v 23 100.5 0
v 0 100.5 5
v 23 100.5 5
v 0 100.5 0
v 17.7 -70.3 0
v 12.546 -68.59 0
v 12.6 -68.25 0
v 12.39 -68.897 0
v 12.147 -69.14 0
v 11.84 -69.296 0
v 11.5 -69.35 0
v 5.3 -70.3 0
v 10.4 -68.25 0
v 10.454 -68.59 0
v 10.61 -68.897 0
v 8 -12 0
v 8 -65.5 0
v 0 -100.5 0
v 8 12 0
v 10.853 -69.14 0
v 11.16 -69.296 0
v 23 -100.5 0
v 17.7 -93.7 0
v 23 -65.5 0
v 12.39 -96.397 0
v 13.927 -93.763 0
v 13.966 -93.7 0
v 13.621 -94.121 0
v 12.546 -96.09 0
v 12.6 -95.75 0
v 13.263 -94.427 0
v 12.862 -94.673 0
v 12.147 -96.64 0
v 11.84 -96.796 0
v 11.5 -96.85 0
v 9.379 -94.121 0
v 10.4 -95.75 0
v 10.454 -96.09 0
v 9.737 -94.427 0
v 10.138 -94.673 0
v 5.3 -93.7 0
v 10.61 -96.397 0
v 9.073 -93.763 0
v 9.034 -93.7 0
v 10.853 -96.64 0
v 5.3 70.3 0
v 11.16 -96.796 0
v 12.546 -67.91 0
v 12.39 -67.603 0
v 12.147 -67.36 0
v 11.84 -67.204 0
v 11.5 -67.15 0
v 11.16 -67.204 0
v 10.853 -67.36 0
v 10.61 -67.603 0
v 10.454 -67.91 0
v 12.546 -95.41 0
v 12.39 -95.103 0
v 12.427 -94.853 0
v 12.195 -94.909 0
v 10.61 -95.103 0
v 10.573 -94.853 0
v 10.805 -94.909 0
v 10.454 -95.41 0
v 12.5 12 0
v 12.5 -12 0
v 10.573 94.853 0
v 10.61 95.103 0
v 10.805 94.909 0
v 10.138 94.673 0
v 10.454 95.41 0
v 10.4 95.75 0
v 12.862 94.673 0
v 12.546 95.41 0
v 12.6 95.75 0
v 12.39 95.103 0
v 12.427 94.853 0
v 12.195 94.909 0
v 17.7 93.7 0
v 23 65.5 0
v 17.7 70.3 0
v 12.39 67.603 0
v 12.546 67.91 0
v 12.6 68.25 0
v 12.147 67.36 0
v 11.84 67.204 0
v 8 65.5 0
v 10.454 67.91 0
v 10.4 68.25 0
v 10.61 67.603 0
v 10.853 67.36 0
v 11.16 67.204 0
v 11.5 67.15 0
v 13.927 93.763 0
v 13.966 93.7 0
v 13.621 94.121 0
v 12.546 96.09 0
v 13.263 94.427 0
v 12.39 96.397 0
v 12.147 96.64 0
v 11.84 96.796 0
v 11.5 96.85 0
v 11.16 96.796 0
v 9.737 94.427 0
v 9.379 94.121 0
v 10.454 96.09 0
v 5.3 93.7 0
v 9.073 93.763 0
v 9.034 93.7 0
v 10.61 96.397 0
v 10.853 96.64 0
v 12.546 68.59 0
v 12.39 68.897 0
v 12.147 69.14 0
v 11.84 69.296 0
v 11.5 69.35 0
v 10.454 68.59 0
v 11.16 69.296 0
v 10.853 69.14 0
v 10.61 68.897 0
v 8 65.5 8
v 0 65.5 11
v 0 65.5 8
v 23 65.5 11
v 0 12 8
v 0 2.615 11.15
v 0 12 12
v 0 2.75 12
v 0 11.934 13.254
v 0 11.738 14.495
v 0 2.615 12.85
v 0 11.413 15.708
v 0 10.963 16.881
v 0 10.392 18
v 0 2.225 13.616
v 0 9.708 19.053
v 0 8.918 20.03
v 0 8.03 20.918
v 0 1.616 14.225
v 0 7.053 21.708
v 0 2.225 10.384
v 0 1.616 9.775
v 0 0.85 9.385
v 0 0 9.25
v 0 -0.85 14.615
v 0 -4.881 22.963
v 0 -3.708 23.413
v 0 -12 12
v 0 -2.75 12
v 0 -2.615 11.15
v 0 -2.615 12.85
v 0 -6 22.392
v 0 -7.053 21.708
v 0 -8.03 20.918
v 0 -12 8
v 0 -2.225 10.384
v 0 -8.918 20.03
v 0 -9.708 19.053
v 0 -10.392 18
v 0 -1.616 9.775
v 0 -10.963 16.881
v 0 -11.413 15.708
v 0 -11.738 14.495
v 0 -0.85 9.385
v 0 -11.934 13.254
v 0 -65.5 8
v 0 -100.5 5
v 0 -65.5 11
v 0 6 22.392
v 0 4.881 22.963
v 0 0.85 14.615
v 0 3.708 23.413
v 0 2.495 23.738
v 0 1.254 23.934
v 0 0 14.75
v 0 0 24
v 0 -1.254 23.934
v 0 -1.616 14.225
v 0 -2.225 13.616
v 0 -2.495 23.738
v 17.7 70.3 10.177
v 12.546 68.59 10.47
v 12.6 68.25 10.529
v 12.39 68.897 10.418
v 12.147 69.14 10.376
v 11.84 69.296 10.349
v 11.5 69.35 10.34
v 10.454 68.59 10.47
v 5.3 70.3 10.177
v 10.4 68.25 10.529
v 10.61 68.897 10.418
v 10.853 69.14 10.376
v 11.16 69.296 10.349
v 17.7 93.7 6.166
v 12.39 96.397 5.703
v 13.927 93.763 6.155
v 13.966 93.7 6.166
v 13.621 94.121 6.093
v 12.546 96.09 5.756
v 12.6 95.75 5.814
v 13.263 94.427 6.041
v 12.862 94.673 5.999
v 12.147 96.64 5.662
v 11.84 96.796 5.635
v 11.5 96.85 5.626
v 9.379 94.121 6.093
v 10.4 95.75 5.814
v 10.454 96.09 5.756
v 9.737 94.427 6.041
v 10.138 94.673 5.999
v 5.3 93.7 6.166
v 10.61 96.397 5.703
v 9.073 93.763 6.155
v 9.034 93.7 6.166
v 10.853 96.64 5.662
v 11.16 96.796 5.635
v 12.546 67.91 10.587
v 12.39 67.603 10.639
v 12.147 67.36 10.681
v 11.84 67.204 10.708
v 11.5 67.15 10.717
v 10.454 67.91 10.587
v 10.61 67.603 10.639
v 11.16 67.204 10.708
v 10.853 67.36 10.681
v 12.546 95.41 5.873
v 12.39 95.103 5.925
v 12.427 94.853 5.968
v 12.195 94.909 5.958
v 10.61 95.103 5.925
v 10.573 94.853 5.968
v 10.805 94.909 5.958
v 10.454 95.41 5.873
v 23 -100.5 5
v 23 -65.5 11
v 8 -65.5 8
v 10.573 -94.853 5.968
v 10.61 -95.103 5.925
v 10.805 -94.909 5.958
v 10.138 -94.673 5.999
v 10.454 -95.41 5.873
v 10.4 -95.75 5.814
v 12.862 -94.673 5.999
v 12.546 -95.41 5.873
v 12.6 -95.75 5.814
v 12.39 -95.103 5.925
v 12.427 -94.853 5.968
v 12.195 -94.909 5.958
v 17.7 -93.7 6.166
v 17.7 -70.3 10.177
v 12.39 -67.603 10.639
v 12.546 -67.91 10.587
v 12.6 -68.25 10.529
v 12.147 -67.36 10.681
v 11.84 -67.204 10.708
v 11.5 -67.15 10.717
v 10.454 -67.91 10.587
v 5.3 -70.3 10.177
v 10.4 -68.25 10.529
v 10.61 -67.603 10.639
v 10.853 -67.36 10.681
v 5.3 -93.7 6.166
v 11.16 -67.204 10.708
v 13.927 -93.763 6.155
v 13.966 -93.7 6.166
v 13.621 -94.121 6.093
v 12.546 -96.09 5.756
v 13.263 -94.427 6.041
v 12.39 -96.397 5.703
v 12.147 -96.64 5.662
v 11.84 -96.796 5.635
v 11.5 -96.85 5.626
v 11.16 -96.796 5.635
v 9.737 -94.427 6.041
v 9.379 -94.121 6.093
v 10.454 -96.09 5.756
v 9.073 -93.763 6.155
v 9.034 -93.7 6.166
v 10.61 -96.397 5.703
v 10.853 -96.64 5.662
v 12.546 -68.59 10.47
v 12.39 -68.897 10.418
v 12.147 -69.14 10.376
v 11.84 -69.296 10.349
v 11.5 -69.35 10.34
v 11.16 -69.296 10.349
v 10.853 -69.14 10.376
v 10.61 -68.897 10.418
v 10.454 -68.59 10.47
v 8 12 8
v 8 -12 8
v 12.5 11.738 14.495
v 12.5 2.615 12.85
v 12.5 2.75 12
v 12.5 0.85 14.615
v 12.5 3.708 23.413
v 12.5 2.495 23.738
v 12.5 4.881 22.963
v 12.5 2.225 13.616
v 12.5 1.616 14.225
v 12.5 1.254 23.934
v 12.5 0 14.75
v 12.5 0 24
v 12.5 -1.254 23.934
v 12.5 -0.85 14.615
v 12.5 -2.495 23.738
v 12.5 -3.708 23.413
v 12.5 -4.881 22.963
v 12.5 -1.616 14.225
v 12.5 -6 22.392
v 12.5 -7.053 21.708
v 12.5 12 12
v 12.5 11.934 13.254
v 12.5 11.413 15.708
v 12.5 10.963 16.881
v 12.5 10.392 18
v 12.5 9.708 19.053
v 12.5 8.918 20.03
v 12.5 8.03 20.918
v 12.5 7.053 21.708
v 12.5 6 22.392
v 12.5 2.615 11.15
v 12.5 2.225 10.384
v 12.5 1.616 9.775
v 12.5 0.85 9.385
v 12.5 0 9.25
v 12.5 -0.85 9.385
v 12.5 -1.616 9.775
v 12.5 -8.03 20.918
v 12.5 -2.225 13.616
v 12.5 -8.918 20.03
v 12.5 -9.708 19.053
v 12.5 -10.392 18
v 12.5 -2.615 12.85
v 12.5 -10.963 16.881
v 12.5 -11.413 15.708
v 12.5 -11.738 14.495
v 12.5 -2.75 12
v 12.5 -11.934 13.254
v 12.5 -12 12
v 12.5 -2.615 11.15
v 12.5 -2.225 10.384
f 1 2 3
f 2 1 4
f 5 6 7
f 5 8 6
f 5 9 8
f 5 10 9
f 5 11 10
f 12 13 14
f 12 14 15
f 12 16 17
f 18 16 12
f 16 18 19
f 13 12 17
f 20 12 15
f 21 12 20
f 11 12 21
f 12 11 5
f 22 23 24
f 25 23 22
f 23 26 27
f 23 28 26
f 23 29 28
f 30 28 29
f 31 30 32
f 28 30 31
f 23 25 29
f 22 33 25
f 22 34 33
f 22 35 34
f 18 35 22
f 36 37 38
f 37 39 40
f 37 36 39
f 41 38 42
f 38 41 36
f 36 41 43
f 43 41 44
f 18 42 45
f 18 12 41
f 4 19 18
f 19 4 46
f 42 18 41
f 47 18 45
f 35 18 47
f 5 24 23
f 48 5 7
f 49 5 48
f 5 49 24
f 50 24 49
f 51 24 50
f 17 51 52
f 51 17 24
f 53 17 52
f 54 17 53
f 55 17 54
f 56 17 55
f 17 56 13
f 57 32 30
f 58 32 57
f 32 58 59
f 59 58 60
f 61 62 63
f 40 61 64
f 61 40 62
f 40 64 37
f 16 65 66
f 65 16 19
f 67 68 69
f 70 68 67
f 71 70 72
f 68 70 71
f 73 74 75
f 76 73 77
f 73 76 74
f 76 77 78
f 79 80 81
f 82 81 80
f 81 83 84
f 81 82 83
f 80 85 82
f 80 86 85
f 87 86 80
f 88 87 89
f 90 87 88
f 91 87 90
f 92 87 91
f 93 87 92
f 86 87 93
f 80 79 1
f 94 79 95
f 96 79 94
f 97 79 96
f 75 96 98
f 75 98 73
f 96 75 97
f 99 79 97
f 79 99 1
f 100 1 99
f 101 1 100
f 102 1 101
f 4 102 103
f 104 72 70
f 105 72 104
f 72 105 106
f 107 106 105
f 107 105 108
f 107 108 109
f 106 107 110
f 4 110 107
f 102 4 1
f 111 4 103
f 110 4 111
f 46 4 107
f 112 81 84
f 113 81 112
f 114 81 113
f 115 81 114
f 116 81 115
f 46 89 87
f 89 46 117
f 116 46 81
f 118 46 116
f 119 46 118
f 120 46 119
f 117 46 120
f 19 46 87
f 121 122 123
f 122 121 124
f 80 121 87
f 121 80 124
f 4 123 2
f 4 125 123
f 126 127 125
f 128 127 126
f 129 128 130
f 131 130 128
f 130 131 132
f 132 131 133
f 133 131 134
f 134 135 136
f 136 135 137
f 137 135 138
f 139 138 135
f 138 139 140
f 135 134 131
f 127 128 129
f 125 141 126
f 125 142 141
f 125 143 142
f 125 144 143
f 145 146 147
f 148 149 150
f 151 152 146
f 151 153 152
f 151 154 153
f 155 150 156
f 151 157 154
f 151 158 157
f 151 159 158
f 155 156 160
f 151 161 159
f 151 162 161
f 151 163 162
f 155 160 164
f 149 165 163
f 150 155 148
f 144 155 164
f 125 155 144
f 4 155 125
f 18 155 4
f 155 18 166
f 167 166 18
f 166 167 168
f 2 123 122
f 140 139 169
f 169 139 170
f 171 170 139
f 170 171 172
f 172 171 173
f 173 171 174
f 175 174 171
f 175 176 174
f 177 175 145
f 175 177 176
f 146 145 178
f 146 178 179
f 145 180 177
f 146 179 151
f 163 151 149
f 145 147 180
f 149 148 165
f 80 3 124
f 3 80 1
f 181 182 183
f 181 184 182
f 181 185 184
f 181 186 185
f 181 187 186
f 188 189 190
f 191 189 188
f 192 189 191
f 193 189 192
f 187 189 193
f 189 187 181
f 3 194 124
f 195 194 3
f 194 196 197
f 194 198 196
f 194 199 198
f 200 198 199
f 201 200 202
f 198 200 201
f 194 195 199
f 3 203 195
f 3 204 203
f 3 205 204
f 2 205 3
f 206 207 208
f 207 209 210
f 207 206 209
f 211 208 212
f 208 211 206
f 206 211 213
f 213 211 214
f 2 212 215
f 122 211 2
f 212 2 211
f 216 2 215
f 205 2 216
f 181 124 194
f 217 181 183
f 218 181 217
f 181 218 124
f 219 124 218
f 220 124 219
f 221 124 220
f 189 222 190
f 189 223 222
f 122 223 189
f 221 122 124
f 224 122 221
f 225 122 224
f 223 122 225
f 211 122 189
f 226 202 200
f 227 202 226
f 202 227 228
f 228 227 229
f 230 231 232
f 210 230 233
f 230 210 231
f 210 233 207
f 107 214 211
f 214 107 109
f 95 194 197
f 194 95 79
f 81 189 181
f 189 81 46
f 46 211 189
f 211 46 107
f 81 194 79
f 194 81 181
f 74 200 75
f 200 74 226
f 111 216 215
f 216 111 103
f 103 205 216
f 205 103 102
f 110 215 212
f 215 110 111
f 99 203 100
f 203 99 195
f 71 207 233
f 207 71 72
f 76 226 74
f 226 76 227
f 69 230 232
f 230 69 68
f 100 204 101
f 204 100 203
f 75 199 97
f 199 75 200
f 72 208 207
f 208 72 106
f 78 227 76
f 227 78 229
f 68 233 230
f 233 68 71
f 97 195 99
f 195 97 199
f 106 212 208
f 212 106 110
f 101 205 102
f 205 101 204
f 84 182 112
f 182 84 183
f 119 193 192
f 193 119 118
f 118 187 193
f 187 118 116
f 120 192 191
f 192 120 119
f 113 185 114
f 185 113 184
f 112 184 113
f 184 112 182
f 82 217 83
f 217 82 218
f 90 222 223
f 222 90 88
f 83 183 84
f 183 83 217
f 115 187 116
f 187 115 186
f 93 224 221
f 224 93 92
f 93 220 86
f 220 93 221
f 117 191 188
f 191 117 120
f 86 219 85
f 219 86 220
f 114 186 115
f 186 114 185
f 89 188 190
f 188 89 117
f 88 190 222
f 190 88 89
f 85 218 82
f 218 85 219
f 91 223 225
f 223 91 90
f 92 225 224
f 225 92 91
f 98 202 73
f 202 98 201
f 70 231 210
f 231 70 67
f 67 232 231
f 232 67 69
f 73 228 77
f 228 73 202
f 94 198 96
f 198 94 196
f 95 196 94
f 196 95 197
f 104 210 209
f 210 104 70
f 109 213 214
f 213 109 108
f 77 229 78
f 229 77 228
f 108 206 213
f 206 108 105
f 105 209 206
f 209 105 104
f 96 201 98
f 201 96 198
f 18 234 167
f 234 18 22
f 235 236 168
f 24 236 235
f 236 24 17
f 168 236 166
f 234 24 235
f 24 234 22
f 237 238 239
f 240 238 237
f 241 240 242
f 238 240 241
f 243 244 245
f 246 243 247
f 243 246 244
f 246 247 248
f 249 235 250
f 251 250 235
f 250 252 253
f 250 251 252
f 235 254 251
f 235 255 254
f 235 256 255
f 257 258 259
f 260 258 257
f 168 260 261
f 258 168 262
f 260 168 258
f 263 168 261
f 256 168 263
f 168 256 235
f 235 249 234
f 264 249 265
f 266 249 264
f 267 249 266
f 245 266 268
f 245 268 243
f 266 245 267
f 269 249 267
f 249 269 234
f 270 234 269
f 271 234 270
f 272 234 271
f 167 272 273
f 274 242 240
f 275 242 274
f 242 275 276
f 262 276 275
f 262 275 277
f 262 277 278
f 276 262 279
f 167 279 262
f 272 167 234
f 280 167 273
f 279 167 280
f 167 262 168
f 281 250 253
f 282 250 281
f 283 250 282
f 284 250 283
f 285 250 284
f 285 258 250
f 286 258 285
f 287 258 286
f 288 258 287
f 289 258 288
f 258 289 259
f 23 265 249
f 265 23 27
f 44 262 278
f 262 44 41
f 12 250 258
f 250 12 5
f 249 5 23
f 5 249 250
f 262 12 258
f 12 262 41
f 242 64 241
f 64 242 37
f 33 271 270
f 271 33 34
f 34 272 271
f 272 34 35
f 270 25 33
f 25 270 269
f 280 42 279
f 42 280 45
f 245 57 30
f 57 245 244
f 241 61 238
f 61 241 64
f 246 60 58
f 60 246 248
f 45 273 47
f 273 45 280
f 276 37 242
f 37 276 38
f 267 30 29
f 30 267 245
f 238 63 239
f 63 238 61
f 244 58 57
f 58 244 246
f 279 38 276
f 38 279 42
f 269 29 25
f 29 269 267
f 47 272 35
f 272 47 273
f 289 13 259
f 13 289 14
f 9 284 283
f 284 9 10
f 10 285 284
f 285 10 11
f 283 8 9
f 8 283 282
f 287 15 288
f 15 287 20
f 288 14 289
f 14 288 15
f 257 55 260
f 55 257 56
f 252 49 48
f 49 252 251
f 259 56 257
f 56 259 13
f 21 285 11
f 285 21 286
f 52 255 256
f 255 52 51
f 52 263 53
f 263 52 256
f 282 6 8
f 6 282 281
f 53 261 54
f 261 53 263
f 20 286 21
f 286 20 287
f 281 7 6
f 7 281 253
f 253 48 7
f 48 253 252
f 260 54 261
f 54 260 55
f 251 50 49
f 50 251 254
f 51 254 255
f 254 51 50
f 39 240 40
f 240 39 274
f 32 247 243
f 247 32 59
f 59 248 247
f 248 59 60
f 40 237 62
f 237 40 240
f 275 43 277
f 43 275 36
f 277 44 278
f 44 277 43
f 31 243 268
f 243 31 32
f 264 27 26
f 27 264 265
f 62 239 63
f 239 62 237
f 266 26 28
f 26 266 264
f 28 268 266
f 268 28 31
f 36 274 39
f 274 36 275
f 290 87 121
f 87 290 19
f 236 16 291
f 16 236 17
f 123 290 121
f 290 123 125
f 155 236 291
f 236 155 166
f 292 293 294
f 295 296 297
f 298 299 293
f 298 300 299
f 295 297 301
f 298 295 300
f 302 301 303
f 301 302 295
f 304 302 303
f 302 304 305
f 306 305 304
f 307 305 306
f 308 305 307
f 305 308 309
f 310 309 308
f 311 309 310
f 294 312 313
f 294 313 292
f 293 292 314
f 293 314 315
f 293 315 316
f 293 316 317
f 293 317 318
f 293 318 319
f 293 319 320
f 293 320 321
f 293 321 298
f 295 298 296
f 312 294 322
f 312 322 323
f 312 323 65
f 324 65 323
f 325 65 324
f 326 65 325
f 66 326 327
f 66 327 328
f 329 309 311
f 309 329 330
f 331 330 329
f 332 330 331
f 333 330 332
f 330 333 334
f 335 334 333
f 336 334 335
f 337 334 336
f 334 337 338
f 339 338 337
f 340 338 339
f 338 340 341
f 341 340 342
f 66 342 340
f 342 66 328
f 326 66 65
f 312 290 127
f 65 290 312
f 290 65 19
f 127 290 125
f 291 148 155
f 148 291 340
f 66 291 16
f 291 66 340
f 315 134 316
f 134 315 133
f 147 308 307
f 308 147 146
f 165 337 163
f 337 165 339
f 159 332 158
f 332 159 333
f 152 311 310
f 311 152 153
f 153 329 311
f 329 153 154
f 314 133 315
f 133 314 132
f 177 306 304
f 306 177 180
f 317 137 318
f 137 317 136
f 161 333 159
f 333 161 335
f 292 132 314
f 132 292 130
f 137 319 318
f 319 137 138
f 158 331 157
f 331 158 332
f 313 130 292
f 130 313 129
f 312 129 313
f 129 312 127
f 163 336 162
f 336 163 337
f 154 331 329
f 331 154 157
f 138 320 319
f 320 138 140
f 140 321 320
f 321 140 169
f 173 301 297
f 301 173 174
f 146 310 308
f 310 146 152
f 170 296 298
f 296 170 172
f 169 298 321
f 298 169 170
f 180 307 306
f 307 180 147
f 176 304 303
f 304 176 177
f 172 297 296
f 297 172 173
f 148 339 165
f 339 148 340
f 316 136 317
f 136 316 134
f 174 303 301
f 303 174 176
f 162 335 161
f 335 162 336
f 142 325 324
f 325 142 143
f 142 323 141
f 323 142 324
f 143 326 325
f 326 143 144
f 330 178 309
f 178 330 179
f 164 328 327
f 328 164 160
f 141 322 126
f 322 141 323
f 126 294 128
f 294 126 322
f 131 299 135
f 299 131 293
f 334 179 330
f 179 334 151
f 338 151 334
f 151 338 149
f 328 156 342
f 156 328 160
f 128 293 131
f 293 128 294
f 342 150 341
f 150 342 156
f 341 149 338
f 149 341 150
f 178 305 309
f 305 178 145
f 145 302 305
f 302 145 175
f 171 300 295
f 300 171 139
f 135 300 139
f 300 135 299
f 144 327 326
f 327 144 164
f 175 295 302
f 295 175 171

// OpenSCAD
translate([11.5,82,0])rotate([0,0,90])
servo_bracket();
translate([11.5,-82,0])rotate([0,0,-90])
servo_bracket();

translate([0,0,12])
difference(){
union(){
translate([4,0,-8])cube([8,140,8],center=true);
translate([0,-12,-12])cube([12.5,24,12]);    
rotate([0,90,0])cylinder(d=24,h=12.5,$fn=60);
}
rotate([0,90,0])cylinder(d=5.5,h=14,$fn=20);
}


module servo_bracket(){
difference(){
union(){
translate([1,0,2.5])cube([35,23,5],center=true);
translate([0,11.5,3])
rotate([90,0,0])linear_extrude(height=23)
polygon([[-16.5,0],[18.5,2],[-16.5,8]]);
translate([13.75,0,0])cylinder(d=8,h=2,$fn=60);
}
cube([23.4,12.4,50],center=true);
translate([13.75,0,-1])cylinder(d=2.2,h=50,$fn=20);
translate([-13.75,0,-1])cylinder(d=2.2,h=50,$fn=20);
translate([10,0,0])cylinder(d=6,h=12,$fn=40);
}
}
